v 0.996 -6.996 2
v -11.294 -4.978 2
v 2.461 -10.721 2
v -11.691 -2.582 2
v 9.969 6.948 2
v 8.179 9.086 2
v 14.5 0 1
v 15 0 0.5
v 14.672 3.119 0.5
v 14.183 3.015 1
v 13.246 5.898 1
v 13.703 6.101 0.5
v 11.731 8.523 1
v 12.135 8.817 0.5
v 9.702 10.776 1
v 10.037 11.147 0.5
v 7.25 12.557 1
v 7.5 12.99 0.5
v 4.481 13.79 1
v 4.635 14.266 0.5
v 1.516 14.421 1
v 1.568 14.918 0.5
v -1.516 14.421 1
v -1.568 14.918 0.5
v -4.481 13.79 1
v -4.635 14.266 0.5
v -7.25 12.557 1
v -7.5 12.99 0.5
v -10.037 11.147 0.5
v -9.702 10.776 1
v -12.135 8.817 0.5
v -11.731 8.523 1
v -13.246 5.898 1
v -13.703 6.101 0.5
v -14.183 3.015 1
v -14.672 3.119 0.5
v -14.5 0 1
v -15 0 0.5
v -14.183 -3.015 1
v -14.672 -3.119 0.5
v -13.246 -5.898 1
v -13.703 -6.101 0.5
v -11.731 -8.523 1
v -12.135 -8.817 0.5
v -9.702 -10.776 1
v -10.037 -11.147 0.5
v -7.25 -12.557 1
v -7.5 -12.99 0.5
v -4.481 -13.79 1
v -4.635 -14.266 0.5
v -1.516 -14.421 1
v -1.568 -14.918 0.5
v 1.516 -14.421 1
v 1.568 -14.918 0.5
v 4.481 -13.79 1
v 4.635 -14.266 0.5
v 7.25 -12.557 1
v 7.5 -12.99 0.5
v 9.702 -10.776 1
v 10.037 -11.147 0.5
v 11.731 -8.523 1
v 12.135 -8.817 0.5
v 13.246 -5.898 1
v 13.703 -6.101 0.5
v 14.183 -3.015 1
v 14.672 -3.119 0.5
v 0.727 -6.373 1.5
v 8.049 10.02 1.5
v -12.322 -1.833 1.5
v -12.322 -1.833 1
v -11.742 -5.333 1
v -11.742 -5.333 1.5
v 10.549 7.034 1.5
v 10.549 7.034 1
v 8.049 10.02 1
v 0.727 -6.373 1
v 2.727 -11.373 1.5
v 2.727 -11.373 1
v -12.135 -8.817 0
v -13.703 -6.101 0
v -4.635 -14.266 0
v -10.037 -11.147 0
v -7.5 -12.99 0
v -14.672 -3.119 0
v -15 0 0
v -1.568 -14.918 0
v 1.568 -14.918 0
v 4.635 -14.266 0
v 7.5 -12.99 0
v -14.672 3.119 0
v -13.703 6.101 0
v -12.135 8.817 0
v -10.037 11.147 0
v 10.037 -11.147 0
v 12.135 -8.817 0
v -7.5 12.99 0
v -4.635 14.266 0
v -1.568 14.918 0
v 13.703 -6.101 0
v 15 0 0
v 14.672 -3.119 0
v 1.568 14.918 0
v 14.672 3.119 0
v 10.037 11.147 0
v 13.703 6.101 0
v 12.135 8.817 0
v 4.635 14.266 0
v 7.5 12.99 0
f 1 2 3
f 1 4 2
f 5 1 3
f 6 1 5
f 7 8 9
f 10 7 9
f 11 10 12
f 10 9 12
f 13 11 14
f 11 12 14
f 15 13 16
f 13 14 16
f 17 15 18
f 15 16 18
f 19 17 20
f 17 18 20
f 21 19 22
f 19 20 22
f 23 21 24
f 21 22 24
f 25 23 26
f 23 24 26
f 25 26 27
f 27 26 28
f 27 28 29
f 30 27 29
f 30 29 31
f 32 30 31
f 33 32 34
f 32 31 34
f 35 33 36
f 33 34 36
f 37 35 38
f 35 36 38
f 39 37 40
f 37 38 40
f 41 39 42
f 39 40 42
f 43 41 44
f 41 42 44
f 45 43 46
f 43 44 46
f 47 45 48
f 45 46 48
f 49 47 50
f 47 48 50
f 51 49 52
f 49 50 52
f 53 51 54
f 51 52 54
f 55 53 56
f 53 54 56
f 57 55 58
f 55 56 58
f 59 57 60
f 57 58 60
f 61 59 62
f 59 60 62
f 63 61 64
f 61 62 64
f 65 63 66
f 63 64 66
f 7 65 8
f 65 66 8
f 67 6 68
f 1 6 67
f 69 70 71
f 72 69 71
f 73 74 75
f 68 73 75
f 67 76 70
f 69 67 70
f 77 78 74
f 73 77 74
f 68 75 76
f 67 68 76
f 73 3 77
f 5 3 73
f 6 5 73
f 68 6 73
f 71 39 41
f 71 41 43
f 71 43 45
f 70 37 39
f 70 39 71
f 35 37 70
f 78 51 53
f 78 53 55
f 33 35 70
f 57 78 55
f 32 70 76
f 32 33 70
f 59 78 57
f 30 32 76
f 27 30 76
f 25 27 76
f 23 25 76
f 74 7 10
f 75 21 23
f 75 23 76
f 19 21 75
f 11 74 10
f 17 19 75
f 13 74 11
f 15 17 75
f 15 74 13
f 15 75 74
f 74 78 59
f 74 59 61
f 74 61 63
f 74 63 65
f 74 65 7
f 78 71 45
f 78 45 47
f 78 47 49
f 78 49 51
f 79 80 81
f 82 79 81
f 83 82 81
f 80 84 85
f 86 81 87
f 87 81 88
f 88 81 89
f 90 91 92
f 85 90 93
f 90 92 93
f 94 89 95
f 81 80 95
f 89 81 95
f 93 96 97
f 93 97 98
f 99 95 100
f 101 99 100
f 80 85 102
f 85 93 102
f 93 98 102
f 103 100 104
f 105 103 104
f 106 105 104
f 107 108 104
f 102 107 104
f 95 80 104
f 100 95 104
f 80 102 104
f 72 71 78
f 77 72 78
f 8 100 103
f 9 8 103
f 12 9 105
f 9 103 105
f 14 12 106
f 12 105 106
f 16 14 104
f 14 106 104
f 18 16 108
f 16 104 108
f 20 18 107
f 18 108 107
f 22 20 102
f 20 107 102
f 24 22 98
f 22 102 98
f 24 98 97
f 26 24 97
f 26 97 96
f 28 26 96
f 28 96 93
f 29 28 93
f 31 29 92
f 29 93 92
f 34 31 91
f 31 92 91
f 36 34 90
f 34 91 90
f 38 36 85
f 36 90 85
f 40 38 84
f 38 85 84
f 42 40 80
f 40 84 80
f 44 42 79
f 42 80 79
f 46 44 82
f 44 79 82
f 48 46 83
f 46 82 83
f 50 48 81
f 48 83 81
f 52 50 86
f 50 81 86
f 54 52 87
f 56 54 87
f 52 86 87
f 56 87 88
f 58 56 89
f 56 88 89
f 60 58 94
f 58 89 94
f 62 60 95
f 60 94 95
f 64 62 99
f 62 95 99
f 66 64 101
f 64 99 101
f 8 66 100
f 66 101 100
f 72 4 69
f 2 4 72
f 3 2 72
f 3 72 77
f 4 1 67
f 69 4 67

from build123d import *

# Parameters (mm, degrees)
SKETCH_R        = 15
PAD_DEPTH       = 1
PAD001_DEPTH    = 1
CHAMFER_SIZE    = 0.5
CHAMFER001_SIZE = 0.5


with BuildPart() as part:
    # Sketch → Pad (new body)
    with BuildSketch(Plane.XY):
        Circle(SKETCH_R)
    extrude(amount=PAD_DEPTH)

    # Sketch001 (on Face3 of Pad) → Pad001 (join)
    with BuildSketch(Plane.XY.offset(1)):
        Polygon((-12.321818, -1.832733), (-11.742344, -5.332733), (2.727027, -11.373328), (10.548595, 7.033819), (8.048595, 10.020412), (0.727027, -6.373328), align=None)
    extrude(amount=PAD001_DEPTH)

    # Chamfer
    chamfer_edges = [part.edges().sort_by_distance(p)[0] for p in [
        (-4.507658, -8.353031, 2),
        (-12.032081, -3.582733, 2),
        (-5.797395, -4.103031, 2),
        (4.387811, 1.823542, 2),
        (6.637811, -2.169755, 2),
        (9.298595, 8.527115, 2),
    ]]
    chamfer(chamfer_edges, length=CHAMFER_SIZE)

    # Chamfer001
    chamfer001_edges = [part.edges().sort_by_distance(p)[0] for p in [
        (-15, 0, 1),
    ]]
    chamfer(chamfer001_edges, length=CHAMFER001_SIZE)


solid = part.part
